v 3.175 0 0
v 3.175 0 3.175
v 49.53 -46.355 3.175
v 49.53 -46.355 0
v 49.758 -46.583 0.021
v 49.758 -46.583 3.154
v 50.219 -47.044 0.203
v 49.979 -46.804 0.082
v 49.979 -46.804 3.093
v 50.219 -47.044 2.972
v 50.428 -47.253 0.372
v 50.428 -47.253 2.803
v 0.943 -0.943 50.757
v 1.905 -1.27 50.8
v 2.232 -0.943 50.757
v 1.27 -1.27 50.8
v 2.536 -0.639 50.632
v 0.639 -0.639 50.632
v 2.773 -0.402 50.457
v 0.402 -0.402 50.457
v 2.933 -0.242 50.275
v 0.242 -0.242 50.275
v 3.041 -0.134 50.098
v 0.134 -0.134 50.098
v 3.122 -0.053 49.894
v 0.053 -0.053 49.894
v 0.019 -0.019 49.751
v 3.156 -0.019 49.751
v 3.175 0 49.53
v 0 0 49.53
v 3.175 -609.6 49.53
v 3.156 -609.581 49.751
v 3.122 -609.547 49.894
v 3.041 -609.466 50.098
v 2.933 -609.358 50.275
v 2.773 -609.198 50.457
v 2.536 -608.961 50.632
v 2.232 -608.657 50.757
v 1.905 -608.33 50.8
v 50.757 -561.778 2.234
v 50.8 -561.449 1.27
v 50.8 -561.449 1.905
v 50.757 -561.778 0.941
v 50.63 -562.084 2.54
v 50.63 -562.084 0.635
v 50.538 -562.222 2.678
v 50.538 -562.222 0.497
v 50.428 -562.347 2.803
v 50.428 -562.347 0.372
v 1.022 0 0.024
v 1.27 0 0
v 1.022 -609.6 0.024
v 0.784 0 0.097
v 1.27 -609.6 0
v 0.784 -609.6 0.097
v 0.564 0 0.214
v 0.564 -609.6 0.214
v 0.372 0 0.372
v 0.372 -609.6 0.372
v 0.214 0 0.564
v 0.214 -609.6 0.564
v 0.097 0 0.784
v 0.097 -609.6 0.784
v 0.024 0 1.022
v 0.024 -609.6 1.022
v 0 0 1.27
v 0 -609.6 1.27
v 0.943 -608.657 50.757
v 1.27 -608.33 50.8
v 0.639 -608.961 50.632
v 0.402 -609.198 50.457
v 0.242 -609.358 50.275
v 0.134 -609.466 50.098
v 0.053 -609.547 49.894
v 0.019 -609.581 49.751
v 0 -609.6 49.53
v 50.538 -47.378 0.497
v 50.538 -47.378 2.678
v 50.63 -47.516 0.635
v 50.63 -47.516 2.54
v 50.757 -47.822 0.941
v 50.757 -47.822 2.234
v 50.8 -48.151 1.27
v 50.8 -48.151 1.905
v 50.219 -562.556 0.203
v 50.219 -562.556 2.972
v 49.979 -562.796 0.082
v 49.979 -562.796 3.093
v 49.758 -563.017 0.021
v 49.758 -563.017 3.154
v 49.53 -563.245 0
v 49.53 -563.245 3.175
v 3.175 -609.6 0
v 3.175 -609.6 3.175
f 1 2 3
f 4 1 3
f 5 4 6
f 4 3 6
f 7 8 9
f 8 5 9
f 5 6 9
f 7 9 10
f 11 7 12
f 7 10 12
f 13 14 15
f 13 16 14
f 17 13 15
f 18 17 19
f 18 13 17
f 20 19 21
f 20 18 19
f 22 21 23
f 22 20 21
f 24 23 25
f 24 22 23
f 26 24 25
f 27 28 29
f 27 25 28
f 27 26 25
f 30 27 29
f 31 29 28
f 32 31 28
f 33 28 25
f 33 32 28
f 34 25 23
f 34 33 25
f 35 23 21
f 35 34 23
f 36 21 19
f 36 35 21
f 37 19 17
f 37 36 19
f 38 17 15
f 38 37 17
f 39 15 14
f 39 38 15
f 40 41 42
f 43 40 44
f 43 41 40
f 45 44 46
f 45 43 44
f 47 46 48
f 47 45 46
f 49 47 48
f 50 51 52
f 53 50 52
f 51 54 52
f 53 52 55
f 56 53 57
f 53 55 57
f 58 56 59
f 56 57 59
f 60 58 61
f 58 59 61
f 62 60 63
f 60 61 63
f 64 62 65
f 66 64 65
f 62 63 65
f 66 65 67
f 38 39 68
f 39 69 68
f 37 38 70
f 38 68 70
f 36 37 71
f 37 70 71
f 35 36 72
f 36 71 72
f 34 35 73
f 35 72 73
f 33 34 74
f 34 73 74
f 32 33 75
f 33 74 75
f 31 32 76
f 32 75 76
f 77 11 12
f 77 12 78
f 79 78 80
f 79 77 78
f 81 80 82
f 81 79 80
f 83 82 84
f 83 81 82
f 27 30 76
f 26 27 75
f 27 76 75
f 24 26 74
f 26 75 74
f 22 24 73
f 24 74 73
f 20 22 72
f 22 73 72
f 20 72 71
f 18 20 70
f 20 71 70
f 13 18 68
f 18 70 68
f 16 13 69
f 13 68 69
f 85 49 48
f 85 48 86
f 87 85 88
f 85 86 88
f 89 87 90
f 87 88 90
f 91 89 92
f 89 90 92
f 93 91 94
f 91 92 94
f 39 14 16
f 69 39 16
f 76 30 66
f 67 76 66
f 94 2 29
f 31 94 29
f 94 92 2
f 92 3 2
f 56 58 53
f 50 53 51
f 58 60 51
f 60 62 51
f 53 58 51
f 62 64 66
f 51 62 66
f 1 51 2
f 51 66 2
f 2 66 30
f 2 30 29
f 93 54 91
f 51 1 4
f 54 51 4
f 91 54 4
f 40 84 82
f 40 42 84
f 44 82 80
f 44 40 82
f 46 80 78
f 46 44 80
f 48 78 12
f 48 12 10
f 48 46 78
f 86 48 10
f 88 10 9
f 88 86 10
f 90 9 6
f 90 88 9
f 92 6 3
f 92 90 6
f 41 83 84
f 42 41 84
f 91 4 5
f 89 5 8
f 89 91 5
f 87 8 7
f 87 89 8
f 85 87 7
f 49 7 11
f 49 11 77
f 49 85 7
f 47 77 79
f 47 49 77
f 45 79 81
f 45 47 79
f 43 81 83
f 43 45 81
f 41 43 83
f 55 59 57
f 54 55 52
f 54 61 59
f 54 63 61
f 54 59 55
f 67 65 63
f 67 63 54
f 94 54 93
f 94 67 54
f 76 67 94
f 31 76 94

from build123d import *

# Parameters (mm, degrees)
F1_DEPTH = 609.6
F3_R     = 1.27
F4_DEPTH = 3.81
F6_DEPTH = 3.81
F7_R     = 1.27
F8_R     = 1.27


with BuildPart() as f1:
    # F0 (on Front) → F1 (new body)
    with BuildSketch(Plane.XZ):
        Polygon((0, 50.8), (0, 0), (50.8, 0), (50.8, 3.175), (3.175, 3.175), (3.175, 50.8), align=None)
    extrude(amount=F1_DEPTH)

    # F3
    f3_edges = [f1.edges().sort_by_distance(p)[0] for p in [
        (3.175, -304.8, 50.8),
        (0, -304.8, 50.8),
        (1.5875, 0, 50.8),
        (1.5875, -609.6, 50.8),
    ]]
    fillet(f3_edges, radius=F3_R)

    # F2 (on face) → F4 (cut)
    with BuildSketch(Plane.XY.offset(3.175)):
        Polygon((50.8, 0), (3.175, 0), (50.8, -47.625), align=None)
    extrude(amount=-F4_DEPTH, mode=Mode.SUBTRACT)

    # F5 (on face) → F6 (cut)
    with BuildSketch(Plane.XY.offset(3.175)):
        Polygon((50.8, -561.975), (3.175, -609.6), (50.8, -609.6), align=None)
    extrude(amount=-F6_DEPTH, mode=Mode.SUBTRACT)

    # F7
    f7_edges = [f1.edges().sort_by_distance(p)[0] for p in [
        (50.8, -304.8, 3.175),
        (50.8, -561.975, 1.5875),
        (50.8, -304.8, 0),
        (50.8, -47.625, 1.5875),
    ]]
    fillet(f7_edges, radius=F7_R)

    # F8
    f8_edges = [f1.edges().sort_by_distance(p)[0] for p in [
        (0, -304.8, 0),
    ]]
    fillet(f8_edges, radius=F8_R)


solid = f1.part
